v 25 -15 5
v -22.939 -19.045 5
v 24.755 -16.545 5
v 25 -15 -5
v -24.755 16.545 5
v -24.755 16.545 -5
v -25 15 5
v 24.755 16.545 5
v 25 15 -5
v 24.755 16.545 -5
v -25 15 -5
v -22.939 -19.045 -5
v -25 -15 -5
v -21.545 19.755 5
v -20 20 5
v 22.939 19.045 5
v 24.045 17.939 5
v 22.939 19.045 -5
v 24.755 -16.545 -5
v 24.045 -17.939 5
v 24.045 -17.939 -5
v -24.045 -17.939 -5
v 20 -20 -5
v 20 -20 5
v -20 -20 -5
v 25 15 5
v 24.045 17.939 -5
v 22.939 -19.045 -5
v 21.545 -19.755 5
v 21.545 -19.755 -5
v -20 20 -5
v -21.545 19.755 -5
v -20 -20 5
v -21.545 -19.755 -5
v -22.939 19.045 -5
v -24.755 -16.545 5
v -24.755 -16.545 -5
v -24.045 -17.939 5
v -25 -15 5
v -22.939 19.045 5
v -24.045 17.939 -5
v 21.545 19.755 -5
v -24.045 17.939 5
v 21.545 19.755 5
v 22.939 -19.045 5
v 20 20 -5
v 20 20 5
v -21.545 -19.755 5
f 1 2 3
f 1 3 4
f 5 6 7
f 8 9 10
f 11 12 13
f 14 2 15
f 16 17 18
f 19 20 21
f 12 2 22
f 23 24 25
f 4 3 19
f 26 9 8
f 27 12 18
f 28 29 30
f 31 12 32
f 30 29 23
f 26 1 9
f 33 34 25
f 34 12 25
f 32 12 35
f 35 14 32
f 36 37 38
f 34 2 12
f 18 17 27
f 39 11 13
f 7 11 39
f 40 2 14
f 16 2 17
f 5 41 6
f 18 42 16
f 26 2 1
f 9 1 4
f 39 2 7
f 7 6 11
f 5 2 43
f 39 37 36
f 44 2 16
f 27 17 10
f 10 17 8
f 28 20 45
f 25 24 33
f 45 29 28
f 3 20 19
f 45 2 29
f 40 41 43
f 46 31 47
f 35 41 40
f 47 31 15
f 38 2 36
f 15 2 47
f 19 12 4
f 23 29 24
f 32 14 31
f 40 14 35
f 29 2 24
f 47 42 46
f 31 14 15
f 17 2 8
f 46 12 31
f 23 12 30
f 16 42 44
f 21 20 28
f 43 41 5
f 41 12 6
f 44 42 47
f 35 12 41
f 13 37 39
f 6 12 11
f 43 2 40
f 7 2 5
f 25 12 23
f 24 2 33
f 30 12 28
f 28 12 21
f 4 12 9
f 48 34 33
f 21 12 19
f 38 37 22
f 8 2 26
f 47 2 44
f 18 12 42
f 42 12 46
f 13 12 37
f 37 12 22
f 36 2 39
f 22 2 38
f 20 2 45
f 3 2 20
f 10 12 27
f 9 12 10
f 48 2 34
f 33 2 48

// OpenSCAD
// objetos redondeados

radio = 5;
altura = 10;
longitudx = 50;
longitudy = 40;

x = longitudx/2-radio;
y = longitudy/2-radio;


Punto1 = [x,y,0];
Punto2 = [-x,y,0];
Punto3 = [-x,-y,0];
Punto4 = [x,-y,0];

hull(){
	translate(Punto1)
		cylinder(r=radio,h=altura,center=true,$fn=20);

	translate(Punto2)
		cylinder(r=radio,h=altura,center=true,$fn=20);

	translate(Punto3)
		cylinder(r=radio,h=altura,center=true,$fn=20);

	translate(Punto4)
		cylinder(r=radio,h=altura,center=true,$fn=20);
}
